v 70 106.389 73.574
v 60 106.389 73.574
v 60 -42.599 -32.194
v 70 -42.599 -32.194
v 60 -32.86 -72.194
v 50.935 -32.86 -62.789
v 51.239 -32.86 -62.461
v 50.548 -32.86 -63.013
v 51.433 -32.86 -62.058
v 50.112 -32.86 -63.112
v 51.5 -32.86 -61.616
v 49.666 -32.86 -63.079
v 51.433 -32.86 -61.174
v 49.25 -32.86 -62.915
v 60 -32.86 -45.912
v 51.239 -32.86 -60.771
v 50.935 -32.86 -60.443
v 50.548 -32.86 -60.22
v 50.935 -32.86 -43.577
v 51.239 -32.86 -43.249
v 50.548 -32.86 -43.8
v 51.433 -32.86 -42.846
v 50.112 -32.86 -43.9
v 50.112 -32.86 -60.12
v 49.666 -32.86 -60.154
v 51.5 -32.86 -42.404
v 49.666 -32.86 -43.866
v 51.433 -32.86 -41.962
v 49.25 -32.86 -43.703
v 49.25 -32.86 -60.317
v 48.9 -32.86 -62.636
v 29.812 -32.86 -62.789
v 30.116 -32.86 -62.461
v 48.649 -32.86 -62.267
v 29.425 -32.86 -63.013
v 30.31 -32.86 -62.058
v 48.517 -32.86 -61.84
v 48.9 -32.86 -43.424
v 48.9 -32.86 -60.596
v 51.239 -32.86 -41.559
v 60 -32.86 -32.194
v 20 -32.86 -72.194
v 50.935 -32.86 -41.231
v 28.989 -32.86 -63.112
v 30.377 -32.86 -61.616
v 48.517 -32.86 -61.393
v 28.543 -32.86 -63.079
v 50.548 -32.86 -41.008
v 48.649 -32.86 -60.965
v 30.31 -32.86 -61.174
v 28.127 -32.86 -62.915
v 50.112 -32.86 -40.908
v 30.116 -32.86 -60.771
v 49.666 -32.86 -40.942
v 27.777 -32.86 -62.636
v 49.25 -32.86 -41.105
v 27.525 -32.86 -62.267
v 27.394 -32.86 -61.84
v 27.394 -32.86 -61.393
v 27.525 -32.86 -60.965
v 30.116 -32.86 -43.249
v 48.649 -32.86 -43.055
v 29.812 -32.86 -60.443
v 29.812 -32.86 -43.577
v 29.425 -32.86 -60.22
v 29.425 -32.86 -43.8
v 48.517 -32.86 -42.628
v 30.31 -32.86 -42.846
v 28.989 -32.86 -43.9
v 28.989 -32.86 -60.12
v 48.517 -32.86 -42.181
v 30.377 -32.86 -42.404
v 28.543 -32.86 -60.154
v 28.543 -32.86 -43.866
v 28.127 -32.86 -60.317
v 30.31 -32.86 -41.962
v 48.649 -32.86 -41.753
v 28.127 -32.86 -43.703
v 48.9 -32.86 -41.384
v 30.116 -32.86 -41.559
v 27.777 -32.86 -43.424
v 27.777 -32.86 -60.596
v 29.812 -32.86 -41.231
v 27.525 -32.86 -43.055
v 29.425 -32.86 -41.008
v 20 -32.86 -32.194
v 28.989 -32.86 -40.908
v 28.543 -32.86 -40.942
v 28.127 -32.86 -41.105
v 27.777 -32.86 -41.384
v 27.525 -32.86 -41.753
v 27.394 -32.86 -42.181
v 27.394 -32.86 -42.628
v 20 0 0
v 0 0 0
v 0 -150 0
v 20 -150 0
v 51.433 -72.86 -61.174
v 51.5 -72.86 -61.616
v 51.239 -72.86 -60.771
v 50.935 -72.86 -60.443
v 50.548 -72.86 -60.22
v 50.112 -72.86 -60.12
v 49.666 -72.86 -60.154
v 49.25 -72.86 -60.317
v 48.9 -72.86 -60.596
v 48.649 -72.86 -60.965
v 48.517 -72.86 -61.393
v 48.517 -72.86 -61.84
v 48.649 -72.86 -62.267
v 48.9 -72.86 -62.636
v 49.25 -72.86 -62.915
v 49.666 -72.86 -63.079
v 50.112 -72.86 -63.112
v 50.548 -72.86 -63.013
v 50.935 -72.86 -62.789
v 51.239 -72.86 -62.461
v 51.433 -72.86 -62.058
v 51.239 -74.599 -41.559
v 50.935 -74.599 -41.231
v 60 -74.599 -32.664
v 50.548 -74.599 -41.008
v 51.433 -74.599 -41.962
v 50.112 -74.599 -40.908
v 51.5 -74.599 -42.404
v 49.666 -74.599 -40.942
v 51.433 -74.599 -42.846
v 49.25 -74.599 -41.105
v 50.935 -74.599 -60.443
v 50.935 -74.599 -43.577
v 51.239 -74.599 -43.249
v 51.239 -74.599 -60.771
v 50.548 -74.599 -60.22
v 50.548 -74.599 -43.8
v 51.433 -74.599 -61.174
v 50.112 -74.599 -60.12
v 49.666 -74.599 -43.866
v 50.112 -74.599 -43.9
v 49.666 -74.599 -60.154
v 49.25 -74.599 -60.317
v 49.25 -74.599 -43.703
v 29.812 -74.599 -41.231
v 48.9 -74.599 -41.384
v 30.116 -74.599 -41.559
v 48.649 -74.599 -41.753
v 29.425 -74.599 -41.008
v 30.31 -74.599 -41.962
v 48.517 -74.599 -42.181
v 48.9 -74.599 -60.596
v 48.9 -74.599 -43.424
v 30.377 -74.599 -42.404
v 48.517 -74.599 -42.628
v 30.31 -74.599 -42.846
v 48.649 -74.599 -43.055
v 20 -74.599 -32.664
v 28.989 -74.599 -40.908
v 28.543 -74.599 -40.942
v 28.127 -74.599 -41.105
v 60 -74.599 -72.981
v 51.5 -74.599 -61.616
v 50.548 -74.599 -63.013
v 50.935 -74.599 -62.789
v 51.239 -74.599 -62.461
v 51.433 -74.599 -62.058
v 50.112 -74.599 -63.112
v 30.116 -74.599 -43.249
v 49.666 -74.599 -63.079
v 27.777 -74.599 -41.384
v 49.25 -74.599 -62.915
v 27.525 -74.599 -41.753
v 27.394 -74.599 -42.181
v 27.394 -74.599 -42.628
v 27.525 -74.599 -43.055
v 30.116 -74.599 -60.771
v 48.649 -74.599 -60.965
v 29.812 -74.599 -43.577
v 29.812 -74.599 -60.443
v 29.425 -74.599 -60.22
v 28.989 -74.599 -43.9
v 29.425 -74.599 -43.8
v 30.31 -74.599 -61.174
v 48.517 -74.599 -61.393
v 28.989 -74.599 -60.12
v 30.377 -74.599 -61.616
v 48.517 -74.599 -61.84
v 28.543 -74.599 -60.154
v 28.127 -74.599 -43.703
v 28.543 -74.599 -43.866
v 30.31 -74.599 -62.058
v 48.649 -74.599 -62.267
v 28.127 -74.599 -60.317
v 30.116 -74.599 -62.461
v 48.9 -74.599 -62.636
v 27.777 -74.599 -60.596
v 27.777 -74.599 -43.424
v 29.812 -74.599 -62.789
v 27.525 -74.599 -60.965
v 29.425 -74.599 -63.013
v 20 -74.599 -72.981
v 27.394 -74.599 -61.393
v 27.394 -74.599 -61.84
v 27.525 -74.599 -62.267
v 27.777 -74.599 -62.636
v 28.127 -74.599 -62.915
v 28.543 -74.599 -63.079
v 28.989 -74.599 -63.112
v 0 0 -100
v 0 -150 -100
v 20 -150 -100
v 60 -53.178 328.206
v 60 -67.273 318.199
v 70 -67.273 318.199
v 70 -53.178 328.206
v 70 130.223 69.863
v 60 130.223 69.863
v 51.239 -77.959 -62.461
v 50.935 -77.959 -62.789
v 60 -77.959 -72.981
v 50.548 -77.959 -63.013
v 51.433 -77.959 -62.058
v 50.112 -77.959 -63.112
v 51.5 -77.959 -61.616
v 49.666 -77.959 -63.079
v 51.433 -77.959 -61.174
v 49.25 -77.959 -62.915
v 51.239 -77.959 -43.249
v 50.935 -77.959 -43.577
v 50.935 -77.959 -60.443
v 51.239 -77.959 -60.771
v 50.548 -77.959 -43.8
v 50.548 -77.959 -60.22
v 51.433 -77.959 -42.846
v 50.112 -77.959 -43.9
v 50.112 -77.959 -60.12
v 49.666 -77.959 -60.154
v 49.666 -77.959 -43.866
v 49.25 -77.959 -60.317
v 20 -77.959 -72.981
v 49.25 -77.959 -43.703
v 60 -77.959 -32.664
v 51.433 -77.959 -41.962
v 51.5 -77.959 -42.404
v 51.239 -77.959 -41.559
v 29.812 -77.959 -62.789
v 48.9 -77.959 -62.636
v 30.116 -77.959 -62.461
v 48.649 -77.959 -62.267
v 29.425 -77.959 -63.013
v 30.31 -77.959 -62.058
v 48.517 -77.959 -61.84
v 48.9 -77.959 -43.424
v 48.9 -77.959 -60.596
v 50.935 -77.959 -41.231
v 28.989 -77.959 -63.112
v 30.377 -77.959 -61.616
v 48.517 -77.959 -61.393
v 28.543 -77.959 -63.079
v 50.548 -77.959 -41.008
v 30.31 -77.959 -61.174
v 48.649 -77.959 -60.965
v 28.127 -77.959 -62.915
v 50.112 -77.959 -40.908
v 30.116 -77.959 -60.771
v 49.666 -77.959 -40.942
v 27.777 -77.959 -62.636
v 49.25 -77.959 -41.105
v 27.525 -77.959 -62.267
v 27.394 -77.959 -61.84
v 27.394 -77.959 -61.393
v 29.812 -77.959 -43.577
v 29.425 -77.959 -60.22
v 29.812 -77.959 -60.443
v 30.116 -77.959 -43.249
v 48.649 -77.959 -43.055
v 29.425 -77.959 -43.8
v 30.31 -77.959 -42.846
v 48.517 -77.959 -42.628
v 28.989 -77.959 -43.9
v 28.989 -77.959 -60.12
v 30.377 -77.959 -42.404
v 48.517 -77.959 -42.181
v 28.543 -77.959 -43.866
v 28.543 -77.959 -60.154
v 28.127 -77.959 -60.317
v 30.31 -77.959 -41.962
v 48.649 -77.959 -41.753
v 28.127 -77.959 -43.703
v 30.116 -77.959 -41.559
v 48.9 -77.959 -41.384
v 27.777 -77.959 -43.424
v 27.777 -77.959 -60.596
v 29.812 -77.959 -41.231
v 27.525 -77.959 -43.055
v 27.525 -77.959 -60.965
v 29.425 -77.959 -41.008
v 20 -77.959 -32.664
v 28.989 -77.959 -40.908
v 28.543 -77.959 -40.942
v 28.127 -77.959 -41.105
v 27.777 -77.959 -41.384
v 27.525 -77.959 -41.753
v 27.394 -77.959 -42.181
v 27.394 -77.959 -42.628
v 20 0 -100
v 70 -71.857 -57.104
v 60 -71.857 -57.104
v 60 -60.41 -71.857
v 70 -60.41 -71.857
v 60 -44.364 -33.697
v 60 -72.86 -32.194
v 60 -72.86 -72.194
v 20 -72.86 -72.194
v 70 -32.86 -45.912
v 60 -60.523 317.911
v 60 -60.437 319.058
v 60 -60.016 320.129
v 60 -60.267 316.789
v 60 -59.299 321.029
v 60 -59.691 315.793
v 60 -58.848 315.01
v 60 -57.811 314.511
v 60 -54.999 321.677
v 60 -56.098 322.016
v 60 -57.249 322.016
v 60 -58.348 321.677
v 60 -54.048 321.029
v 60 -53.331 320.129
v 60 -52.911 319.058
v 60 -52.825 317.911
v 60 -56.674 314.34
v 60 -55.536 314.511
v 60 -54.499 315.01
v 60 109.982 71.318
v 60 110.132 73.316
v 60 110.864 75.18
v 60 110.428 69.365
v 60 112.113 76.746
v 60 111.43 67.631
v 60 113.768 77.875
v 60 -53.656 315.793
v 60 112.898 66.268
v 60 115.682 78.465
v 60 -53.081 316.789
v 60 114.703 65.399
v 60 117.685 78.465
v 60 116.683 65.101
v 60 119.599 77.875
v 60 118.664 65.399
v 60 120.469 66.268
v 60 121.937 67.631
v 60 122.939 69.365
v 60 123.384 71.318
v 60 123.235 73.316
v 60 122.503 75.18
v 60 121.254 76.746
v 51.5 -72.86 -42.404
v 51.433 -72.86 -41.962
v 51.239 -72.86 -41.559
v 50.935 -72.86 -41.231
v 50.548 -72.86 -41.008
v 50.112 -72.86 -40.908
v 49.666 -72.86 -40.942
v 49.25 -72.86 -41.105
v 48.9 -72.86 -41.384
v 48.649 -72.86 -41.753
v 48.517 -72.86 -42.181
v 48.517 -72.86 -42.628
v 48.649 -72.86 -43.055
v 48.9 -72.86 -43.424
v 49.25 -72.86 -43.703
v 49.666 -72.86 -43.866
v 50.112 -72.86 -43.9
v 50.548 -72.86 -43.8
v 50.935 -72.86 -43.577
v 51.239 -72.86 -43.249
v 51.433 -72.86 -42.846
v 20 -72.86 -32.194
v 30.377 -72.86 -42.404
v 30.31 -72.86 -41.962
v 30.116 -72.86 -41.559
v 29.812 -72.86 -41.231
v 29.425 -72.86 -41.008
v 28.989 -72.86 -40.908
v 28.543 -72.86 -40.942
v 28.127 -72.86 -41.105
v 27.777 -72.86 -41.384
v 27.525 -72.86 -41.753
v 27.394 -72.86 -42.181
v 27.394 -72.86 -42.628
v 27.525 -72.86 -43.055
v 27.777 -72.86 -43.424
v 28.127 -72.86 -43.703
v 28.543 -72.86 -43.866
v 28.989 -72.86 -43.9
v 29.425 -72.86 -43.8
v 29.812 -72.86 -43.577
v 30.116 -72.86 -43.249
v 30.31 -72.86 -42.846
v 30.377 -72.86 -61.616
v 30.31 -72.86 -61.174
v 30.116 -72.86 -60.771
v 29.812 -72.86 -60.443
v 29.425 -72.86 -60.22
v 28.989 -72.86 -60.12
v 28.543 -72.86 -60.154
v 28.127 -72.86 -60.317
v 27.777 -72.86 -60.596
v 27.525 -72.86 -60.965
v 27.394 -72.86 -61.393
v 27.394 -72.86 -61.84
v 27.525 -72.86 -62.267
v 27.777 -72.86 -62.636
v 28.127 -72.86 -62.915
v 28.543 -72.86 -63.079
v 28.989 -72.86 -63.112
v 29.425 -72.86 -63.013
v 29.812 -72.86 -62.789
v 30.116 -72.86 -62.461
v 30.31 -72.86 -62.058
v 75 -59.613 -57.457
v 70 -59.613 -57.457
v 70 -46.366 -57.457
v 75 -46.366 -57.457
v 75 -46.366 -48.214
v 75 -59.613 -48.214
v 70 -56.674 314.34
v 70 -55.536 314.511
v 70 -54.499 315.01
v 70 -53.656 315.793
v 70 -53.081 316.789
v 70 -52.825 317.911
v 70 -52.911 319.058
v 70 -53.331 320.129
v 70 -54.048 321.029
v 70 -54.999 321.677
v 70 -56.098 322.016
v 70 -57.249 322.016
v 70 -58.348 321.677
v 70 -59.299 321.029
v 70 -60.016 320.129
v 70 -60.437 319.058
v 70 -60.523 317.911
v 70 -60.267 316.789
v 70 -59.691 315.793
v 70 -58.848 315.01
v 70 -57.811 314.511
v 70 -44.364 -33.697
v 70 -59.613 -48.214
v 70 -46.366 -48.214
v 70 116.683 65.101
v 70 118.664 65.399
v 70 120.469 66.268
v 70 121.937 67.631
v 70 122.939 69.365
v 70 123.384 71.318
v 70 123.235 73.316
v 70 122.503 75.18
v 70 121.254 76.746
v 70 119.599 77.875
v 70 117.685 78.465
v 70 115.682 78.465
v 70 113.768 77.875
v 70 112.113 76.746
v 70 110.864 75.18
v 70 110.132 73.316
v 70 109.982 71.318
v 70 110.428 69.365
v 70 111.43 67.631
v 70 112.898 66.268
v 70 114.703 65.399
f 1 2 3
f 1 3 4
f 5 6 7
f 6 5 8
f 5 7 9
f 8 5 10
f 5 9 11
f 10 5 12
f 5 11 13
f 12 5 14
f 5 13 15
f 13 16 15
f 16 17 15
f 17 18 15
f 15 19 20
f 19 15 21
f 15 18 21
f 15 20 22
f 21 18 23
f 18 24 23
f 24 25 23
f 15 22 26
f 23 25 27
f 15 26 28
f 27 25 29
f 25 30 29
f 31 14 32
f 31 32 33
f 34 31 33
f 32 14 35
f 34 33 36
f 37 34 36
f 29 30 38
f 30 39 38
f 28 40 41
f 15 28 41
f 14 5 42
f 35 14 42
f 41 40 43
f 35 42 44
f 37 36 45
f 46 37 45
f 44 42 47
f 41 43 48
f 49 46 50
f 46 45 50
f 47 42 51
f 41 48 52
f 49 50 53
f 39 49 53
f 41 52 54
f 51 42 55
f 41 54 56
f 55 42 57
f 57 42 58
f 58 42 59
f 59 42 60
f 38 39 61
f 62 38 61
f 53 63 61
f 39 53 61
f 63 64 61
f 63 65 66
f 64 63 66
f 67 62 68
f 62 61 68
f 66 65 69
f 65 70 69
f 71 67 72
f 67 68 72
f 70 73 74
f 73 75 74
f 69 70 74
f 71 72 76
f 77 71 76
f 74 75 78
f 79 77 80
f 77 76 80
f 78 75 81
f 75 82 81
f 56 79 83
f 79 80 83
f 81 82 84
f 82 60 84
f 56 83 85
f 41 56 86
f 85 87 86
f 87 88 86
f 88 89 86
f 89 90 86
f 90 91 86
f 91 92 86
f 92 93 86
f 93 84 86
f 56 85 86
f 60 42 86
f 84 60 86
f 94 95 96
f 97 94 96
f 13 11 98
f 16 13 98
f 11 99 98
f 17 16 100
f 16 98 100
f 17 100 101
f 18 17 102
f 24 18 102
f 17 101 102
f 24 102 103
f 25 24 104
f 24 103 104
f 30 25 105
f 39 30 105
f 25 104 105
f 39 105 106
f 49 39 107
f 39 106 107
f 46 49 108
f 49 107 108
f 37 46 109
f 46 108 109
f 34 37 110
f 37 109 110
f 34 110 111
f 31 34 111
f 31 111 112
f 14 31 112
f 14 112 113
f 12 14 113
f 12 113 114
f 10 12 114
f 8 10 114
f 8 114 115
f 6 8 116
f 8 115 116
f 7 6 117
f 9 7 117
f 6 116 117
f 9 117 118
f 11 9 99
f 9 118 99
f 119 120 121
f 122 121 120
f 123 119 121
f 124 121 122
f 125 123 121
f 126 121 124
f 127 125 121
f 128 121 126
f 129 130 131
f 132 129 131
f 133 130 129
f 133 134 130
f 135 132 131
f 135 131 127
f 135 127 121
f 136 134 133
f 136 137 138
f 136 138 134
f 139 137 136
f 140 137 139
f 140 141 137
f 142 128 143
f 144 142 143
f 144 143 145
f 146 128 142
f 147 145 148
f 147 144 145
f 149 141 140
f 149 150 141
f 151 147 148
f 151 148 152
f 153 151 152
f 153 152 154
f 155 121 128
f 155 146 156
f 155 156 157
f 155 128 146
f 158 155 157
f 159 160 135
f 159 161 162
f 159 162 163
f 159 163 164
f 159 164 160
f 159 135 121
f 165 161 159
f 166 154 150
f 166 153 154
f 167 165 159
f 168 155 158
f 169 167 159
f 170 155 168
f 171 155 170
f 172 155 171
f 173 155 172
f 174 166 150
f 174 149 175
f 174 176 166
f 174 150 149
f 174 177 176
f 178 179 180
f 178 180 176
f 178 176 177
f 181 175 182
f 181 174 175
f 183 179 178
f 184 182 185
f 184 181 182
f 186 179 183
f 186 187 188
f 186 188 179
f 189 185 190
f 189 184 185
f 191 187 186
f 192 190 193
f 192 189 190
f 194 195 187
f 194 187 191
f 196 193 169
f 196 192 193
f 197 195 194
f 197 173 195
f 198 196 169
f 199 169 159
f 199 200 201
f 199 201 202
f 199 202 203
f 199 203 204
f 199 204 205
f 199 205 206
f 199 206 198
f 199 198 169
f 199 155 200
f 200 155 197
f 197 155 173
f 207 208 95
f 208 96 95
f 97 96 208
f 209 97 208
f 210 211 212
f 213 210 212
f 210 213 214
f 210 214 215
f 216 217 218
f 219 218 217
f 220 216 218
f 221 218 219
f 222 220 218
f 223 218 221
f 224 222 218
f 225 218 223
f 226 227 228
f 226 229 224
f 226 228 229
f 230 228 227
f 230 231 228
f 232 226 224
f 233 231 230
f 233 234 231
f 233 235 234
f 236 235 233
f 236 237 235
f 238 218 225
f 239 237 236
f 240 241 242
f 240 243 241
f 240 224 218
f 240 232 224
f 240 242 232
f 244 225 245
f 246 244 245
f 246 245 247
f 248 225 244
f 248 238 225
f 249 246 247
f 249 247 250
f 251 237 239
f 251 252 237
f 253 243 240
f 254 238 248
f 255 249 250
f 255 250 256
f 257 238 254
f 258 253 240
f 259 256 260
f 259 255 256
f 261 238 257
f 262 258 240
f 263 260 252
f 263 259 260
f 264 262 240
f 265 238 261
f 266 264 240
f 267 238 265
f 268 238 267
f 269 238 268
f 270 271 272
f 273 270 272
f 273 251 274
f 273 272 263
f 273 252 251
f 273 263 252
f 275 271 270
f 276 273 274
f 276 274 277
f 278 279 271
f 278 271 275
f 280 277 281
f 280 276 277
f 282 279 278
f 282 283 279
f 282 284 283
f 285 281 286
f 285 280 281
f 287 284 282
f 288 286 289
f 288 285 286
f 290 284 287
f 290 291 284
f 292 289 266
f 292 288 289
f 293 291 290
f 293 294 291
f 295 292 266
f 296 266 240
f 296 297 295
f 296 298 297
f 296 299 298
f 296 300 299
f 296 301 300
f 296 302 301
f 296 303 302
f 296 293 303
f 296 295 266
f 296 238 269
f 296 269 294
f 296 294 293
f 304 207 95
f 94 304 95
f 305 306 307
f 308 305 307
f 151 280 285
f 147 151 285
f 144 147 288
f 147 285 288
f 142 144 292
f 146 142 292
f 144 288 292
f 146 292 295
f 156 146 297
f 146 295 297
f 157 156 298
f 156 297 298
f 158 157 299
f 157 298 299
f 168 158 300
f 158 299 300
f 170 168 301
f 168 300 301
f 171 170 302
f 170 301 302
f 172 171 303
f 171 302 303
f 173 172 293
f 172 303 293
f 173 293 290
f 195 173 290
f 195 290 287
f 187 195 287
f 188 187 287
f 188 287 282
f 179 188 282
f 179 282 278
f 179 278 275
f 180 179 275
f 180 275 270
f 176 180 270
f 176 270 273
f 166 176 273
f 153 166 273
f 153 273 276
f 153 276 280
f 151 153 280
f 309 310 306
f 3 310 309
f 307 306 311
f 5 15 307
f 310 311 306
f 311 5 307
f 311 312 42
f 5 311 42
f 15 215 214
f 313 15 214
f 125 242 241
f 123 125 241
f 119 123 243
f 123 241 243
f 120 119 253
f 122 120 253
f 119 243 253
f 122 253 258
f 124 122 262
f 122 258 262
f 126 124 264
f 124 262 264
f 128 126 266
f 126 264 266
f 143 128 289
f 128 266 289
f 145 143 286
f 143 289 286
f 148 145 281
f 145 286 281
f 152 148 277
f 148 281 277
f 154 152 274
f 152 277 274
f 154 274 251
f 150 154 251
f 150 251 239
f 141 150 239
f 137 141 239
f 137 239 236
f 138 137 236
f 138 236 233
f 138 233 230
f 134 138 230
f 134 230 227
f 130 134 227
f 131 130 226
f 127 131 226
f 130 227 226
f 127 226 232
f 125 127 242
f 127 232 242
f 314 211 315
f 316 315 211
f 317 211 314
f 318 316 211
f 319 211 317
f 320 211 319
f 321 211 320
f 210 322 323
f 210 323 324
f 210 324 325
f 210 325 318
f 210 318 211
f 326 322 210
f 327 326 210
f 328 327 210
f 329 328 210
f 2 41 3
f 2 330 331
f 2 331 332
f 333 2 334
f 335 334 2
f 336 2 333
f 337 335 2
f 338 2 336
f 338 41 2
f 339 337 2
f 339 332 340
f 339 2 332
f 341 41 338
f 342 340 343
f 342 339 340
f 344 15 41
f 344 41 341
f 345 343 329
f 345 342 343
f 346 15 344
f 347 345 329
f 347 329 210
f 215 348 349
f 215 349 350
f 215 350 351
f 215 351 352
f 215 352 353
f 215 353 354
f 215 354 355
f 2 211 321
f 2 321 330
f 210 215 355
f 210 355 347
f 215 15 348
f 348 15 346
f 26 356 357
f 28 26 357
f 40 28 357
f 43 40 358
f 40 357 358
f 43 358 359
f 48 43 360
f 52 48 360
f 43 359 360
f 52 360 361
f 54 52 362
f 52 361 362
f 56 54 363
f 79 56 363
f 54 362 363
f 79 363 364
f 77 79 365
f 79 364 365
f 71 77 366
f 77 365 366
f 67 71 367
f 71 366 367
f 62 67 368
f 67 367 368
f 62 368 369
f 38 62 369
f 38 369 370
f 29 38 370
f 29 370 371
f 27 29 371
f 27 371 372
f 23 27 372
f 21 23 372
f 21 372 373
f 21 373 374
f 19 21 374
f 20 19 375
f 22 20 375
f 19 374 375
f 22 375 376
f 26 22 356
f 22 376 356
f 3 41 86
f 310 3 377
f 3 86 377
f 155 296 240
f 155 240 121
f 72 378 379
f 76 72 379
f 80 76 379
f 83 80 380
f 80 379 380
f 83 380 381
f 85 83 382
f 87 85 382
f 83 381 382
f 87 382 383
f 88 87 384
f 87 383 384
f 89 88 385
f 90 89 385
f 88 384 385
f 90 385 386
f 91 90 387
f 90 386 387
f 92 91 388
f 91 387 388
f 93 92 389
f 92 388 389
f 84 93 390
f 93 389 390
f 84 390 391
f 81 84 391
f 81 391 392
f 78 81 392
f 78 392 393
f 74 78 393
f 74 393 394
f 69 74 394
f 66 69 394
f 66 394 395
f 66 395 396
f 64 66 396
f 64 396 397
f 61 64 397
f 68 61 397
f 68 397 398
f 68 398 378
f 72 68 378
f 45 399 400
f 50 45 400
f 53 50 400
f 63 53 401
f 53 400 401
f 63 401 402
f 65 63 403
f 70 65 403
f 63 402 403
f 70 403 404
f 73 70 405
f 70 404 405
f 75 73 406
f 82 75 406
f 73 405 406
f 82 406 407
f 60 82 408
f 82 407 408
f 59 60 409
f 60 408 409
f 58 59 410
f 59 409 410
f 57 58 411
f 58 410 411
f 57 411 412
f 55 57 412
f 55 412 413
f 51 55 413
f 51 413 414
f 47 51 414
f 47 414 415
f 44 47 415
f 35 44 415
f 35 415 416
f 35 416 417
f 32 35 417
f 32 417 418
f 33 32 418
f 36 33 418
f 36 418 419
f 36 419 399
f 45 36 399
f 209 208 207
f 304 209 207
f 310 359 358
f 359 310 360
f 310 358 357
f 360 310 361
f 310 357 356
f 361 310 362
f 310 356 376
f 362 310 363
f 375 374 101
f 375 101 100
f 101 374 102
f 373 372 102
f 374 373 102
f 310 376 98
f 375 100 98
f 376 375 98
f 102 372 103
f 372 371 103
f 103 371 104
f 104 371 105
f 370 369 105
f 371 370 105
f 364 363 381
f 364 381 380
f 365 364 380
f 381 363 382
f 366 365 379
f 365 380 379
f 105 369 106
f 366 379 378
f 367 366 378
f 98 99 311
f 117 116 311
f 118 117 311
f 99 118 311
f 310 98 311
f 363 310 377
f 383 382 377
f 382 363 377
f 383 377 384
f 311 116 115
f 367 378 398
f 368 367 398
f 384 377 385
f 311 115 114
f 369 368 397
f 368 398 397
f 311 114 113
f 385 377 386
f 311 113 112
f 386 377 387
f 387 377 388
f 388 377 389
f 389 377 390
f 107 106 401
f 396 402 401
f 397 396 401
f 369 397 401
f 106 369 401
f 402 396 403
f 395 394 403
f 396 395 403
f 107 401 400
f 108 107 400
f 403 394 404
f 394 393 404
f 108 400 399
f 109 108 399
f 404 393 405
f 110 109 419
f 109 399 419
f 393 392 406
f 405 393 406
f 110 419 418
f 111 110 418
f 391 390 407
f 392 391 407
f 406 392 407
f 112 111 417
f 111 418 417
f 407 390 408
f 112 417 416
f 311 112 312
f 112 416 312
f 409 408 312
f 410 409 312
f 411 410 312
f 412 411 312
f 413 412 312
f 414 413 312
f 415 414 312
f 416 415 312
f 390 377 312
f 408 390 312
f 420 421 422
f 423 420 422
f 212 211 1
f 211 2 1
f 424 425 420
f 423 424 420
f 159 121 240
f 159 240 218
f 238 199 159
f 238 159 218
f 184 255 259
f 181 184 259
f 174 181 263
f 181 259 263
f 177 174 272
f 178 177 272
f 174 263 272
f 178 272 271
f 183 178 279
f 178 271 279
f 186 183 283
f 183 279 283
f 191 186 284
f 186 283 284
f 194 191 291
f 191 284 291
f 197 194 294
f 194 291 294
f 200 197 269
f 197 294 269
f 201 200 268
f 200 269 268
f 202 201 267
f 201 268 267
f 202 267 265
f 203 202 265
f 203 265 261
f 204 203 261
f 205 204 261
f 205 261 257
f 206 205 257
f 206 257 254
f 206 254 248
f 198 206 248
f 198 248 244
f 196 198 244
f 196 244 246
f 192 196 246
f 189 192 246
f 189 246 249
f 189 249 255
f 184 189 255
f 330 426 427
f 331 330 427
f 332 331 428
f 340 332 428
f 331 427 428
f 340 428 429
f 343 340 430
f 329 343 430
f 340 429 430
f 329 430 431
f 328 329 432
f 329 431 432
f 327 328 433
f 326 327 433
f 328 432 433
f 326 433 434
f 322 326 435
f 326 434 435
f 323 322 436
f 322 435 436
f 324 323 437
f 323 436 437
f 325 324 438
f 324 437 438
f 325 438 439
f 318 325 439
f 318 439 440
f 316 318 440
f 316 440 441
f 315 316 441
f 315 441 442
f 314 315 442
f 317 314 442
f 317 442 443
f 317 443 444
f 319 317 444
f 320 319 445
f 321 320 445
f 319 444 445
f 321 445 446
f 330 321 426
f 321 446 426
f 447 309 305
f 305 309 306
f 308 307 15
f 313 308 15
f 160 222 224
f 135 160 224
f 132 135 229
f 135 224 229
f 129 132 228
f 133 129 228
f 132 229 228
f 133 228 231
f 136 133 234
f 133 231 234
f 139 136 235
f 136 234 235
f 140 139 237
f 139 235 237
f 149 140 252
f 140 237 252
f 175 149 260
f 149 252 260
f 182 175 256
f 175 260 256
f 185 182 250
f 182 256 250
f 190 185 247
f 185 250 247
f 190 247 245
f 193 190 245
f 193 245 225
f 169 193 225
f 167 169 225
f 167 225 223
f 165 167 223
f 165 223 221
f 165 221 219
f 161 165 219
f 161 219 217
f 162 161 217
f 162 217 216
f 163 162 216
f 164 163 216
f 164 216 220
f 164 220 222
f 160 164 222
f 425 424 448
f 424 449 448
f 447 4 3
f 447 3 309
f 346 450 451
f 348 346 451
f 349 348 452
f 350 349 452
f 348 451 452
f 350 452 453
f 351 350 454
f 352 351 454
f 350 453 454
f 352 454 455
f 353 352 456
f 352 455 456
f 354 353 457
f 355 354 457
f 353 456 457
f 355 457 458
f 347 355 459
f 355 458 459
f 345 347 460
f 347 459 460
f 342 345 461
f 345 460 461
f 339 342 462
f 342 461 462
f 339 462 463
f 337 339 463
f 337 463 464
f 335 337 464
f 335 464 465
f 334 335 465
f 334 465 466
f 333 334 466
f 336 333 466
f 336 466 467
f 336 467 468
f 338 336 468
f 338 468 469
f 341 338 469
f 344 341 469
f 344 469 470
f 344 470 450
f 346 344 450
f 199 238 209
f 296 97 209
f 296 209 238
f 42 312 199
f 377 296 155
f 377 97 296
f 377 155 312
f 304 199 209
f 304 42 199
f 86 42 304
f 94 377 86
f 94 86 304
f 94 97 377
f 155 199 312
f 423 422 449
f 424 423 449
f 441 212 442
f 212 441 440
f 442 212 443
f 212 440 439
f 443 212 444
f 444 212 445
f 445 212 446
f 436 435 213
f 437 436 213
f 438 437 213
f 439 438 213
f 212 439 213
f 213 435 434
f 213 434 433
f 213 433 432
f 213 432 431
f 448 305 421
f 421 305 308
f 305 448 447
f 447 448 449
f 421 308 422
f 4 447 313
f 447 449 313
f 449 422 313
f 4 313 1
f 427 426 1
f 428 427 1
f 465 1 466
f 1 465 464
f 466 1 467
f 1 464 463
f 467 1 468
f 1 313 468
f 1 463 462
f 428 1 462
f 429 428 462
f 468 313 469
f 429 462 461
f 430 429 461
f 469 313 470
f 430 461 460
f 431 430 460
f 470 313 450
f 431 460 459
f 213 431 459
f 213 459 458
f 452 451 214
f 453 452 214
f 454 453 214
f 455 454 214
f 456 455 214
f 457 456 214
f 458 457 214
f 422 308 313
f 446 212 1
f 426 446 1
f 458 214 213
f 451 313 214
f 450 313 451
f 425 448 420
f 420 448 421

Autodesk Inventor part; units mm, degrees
ref_plane "YZ Plane" through (0, 0, 0) normal (1, 0, 0) x (0, 1, 0)
ref_plane "XZ Plane" through (0, 0, 0) normal (0, 1, 0) x (-1, 0, 0)
ref_plane "XY Plane" through (0, 0, 0) normal (0, 0, 1) x (1, 0, 0)
sketch "Sketch1" plane through (0, 0, 0) normal (1, 0, 0) x (0, 1, 0)
  line L0 (0, 0) -> (-150, 0)
  line L1 (-150, 0) -> (-150, -100)
  line L2 (-150, -100) -> (0, -100)
  line L3 (0, -100) -> (0, 0)
  dimension "d0" = 150
  dimension "d1" = 100
extrude "Extrusion1" add sketch "Sketch1" along normal blind 20
sketch "Sketch2" plane through (20, 0, 0) normal (1, 0, 0) x (0, 0, -1)
  line L0 (32.1942, -72.8605) -> (72.1942, -72.8605)
  line L1 (72.1942, -72.8605) -> (72.1942, -32.8605)
  line L2 (72.1942, -32.8605) -> (32.1942, -32.8605)
  line L3 (32.1942, -32.8605) -> (32.1942, -72.8605)
  point P0 (0, 0)
  dimension "d4" = 40
  dimension "d5" = 40
extrude "Extrusion2" add sketch "Sketch2" along normal blind 40
sketch "Sketch3" plane through (60, 0, 0) normal (1, 0, 0) x (0, 0, -1)
  line L0 (32.1942, -72.8605) -> (32.1942, -32.8605) projected
  line L1 (32.1942, -72.8605) -> (32.1942, -32.8605)
  line L2 (32.1942, -32.8605) -> (32.1942, -52.8605)
  line L3 (48.2142, -59.6131) -> (57.4566, -59.6131)
  line L4 (57.4566, -59.6131) -> (57.4566, -46.3658)
  line L5 (57.4566, -46.3658) -> (48.2142, -46.3658)
  line L6 (48.2142, -46.3658) -> (48.2142, -59.6131)
  point P0 (0, 0)
extrude "Extrusion3" add sketch "Sketch3" along normal blind 15
sketch "Sketch4" plane through (60, 0, 0) normal (1, 0, 0) x (0, 0, -1)
  point P0 (0, 0)
sketch "Sketch5" plane through (60, 0, 0) normal (1, 0, 0) x (0, 0, -1)
  line L0 (57.1037, -71.8566) -> (71.8566, -60.4104)
  line L1 (71.8566, -60.4104) -> (45.9119, -32.8605)
  line L2 (32.1942, -32.8605) -> (72.1942, -32.8605) projected
  line L3 (33.6968, -44.3638) -> (57.1037, -71.8566)
  line L4 (32.1942, -42.5989) -> (45.9119, -32.8605)
  line L5 (32.1942, -42.5989) -> (57.1037, -71.8566)
  point P0 (0, 0)
extrude "Extrusion4" add sketch "Sketch5" along normal blind 10
sketch "Sketch6" plane through (60, -42.5989, -32.1942) normal (0, 0.8154167, 0.5788745) x (1, 0, 0)
  line L0 (0, 16.823) -> (10, 16.823) projected
  line L1 (0, 0) -> (10, 0) projected
  line L2 (10, 16.823) -> (0, 16.823)
  line L3 (0, 16.823) -> (0, 0)
  line L4 (0, 0) -> (10, 0)
  line L5 (10, 0) -> (10, 16.823)
  point P0 (-60, -1.5923)
extrude "Extrusion5" add sketch "Sketch6" along normal blind 200
sketch "Sketch7" plane through (60, -42.5989, -32.1942) normal (0, -0.5788745, 0.8154167) x (1, 0, 0)
  line L0 (10, 0) -> (10, 200) projected
  line L1 (0, 0) -> (0, 200) projected
  line L2 (10, 200) -> (0, 200)
  line L3 (0, 200) -> (0, 182.714)
  line L4 (0, 182.714) -> (10, 182.714)
  line L5 (10, 182.714) -> (10, 200)
  point P0 (-60, 53.3722)
extrude "Extrusion6" add sketch "Sketch7" along normal blind 300
sketch "Sketch8" plane through (70, 0, 0) normal (1, 0, 0) x (0, 0, -1)
  point P0 (0, 0)
sketch "Sketch9" plane through (70, 0, 0) normal (1, 0, 0) x (0, 0, -1)
  circle A0 centre (-71.8205, 116.6834) radius 6.7198
  point P0 (0, 0)
extrude "Extrusion7" cut sketch "Sketch9" along normal through all both and the other way through all
sketch "Sketch10" plane through (70, 0, 0) normal (1, 0, 0) x (0, 0, -1)
  point P0 (0, 0)
sketch "Sketch11" plane through (70, 0, 0) normal (1, 0, 0) x (0, 0, -1)
  circle A0 centre (-318.1993, -56.6737) radius 3.8597
  point P0 (0, 0)
extrude "Extrusion8" cut sketch "Sketch11" along normal through all both and the other way through all
sketch "Sketch16" plane through (20, 0, 0) normal (1, 0, 0) x (0, 0, -1)
  point P0 (0, 0)
sketch "Sketch17" plane through (20, 0, 0) normal (1, 0, 0) x (0, 0, -1)
  line L0 (32.6643, -74.5991) -> (72.9814, -74.5991)
  line L1 (72.9814, -74.5991) -> (72.9814, -77.9588)
  line L2 (72.9814, -77.9588) -> (32.6643, -77.9588)
  line L3 (32.6643, -77.9588) -> (32.6643, -74.5991)
  point P0 (0, 0)
extrude "Extrusion9" add sketch "Sketch17" along normal blind 40
sketch "Sketch18" plane through (20, -77.9588, -72.9814) normal (0, -1, 0) x (1, 0, 0)
  line L0 (0, 0.7872) -> (40, 0.7872) projected
  line L1 (40, 40.3171) -> (40, 0.7872)
  line L2 (40, 0.7872) -> (0, 0.7872)
  line L3 (0, 0.7872) -> (0, 40.3171)
  line L4 (0, 40.3171) -> (40, 40.3171)
  line L5 (40, 40.3171) -> (40, 0) projected
  line L6 (40, 20.1585) -> (0, 20.5522)
  line L7 (20, 40.3171) -> (20, 0)
  line L8 (0, 0) -> (40, 0) projected
  line L9 (40, 40.3171) -> (20, 40.3171)
  line L10 (30, 40.3171) -> (20, 40.3171)
  line L11 (0, 40.3171) -> (40, 40.3171) projected
  line L12 (0, 40.3171) -> (20, 40.3171)
  circle A0 centre (30, 30.5773) radius 1.5
  circle A1 centre (30, 11.3652) radius 1.5
  circle A2 centre (8.8768, 11.3652) radius 1.5
  circle A3 centre (8.8768, 30.5773) radius 1.5
  point P0 (-20, 72.9814)
  dimension "d22" = 3
  dimension "d23" = 3
  dimension "d24" = 3
  dimension "d25" = 3
extrude "Extrusion10" cut sketch "Sketch18" along normal through all both and the other way through all contours A0 | A1 | A2 | A3
properties part number "horizontal"
